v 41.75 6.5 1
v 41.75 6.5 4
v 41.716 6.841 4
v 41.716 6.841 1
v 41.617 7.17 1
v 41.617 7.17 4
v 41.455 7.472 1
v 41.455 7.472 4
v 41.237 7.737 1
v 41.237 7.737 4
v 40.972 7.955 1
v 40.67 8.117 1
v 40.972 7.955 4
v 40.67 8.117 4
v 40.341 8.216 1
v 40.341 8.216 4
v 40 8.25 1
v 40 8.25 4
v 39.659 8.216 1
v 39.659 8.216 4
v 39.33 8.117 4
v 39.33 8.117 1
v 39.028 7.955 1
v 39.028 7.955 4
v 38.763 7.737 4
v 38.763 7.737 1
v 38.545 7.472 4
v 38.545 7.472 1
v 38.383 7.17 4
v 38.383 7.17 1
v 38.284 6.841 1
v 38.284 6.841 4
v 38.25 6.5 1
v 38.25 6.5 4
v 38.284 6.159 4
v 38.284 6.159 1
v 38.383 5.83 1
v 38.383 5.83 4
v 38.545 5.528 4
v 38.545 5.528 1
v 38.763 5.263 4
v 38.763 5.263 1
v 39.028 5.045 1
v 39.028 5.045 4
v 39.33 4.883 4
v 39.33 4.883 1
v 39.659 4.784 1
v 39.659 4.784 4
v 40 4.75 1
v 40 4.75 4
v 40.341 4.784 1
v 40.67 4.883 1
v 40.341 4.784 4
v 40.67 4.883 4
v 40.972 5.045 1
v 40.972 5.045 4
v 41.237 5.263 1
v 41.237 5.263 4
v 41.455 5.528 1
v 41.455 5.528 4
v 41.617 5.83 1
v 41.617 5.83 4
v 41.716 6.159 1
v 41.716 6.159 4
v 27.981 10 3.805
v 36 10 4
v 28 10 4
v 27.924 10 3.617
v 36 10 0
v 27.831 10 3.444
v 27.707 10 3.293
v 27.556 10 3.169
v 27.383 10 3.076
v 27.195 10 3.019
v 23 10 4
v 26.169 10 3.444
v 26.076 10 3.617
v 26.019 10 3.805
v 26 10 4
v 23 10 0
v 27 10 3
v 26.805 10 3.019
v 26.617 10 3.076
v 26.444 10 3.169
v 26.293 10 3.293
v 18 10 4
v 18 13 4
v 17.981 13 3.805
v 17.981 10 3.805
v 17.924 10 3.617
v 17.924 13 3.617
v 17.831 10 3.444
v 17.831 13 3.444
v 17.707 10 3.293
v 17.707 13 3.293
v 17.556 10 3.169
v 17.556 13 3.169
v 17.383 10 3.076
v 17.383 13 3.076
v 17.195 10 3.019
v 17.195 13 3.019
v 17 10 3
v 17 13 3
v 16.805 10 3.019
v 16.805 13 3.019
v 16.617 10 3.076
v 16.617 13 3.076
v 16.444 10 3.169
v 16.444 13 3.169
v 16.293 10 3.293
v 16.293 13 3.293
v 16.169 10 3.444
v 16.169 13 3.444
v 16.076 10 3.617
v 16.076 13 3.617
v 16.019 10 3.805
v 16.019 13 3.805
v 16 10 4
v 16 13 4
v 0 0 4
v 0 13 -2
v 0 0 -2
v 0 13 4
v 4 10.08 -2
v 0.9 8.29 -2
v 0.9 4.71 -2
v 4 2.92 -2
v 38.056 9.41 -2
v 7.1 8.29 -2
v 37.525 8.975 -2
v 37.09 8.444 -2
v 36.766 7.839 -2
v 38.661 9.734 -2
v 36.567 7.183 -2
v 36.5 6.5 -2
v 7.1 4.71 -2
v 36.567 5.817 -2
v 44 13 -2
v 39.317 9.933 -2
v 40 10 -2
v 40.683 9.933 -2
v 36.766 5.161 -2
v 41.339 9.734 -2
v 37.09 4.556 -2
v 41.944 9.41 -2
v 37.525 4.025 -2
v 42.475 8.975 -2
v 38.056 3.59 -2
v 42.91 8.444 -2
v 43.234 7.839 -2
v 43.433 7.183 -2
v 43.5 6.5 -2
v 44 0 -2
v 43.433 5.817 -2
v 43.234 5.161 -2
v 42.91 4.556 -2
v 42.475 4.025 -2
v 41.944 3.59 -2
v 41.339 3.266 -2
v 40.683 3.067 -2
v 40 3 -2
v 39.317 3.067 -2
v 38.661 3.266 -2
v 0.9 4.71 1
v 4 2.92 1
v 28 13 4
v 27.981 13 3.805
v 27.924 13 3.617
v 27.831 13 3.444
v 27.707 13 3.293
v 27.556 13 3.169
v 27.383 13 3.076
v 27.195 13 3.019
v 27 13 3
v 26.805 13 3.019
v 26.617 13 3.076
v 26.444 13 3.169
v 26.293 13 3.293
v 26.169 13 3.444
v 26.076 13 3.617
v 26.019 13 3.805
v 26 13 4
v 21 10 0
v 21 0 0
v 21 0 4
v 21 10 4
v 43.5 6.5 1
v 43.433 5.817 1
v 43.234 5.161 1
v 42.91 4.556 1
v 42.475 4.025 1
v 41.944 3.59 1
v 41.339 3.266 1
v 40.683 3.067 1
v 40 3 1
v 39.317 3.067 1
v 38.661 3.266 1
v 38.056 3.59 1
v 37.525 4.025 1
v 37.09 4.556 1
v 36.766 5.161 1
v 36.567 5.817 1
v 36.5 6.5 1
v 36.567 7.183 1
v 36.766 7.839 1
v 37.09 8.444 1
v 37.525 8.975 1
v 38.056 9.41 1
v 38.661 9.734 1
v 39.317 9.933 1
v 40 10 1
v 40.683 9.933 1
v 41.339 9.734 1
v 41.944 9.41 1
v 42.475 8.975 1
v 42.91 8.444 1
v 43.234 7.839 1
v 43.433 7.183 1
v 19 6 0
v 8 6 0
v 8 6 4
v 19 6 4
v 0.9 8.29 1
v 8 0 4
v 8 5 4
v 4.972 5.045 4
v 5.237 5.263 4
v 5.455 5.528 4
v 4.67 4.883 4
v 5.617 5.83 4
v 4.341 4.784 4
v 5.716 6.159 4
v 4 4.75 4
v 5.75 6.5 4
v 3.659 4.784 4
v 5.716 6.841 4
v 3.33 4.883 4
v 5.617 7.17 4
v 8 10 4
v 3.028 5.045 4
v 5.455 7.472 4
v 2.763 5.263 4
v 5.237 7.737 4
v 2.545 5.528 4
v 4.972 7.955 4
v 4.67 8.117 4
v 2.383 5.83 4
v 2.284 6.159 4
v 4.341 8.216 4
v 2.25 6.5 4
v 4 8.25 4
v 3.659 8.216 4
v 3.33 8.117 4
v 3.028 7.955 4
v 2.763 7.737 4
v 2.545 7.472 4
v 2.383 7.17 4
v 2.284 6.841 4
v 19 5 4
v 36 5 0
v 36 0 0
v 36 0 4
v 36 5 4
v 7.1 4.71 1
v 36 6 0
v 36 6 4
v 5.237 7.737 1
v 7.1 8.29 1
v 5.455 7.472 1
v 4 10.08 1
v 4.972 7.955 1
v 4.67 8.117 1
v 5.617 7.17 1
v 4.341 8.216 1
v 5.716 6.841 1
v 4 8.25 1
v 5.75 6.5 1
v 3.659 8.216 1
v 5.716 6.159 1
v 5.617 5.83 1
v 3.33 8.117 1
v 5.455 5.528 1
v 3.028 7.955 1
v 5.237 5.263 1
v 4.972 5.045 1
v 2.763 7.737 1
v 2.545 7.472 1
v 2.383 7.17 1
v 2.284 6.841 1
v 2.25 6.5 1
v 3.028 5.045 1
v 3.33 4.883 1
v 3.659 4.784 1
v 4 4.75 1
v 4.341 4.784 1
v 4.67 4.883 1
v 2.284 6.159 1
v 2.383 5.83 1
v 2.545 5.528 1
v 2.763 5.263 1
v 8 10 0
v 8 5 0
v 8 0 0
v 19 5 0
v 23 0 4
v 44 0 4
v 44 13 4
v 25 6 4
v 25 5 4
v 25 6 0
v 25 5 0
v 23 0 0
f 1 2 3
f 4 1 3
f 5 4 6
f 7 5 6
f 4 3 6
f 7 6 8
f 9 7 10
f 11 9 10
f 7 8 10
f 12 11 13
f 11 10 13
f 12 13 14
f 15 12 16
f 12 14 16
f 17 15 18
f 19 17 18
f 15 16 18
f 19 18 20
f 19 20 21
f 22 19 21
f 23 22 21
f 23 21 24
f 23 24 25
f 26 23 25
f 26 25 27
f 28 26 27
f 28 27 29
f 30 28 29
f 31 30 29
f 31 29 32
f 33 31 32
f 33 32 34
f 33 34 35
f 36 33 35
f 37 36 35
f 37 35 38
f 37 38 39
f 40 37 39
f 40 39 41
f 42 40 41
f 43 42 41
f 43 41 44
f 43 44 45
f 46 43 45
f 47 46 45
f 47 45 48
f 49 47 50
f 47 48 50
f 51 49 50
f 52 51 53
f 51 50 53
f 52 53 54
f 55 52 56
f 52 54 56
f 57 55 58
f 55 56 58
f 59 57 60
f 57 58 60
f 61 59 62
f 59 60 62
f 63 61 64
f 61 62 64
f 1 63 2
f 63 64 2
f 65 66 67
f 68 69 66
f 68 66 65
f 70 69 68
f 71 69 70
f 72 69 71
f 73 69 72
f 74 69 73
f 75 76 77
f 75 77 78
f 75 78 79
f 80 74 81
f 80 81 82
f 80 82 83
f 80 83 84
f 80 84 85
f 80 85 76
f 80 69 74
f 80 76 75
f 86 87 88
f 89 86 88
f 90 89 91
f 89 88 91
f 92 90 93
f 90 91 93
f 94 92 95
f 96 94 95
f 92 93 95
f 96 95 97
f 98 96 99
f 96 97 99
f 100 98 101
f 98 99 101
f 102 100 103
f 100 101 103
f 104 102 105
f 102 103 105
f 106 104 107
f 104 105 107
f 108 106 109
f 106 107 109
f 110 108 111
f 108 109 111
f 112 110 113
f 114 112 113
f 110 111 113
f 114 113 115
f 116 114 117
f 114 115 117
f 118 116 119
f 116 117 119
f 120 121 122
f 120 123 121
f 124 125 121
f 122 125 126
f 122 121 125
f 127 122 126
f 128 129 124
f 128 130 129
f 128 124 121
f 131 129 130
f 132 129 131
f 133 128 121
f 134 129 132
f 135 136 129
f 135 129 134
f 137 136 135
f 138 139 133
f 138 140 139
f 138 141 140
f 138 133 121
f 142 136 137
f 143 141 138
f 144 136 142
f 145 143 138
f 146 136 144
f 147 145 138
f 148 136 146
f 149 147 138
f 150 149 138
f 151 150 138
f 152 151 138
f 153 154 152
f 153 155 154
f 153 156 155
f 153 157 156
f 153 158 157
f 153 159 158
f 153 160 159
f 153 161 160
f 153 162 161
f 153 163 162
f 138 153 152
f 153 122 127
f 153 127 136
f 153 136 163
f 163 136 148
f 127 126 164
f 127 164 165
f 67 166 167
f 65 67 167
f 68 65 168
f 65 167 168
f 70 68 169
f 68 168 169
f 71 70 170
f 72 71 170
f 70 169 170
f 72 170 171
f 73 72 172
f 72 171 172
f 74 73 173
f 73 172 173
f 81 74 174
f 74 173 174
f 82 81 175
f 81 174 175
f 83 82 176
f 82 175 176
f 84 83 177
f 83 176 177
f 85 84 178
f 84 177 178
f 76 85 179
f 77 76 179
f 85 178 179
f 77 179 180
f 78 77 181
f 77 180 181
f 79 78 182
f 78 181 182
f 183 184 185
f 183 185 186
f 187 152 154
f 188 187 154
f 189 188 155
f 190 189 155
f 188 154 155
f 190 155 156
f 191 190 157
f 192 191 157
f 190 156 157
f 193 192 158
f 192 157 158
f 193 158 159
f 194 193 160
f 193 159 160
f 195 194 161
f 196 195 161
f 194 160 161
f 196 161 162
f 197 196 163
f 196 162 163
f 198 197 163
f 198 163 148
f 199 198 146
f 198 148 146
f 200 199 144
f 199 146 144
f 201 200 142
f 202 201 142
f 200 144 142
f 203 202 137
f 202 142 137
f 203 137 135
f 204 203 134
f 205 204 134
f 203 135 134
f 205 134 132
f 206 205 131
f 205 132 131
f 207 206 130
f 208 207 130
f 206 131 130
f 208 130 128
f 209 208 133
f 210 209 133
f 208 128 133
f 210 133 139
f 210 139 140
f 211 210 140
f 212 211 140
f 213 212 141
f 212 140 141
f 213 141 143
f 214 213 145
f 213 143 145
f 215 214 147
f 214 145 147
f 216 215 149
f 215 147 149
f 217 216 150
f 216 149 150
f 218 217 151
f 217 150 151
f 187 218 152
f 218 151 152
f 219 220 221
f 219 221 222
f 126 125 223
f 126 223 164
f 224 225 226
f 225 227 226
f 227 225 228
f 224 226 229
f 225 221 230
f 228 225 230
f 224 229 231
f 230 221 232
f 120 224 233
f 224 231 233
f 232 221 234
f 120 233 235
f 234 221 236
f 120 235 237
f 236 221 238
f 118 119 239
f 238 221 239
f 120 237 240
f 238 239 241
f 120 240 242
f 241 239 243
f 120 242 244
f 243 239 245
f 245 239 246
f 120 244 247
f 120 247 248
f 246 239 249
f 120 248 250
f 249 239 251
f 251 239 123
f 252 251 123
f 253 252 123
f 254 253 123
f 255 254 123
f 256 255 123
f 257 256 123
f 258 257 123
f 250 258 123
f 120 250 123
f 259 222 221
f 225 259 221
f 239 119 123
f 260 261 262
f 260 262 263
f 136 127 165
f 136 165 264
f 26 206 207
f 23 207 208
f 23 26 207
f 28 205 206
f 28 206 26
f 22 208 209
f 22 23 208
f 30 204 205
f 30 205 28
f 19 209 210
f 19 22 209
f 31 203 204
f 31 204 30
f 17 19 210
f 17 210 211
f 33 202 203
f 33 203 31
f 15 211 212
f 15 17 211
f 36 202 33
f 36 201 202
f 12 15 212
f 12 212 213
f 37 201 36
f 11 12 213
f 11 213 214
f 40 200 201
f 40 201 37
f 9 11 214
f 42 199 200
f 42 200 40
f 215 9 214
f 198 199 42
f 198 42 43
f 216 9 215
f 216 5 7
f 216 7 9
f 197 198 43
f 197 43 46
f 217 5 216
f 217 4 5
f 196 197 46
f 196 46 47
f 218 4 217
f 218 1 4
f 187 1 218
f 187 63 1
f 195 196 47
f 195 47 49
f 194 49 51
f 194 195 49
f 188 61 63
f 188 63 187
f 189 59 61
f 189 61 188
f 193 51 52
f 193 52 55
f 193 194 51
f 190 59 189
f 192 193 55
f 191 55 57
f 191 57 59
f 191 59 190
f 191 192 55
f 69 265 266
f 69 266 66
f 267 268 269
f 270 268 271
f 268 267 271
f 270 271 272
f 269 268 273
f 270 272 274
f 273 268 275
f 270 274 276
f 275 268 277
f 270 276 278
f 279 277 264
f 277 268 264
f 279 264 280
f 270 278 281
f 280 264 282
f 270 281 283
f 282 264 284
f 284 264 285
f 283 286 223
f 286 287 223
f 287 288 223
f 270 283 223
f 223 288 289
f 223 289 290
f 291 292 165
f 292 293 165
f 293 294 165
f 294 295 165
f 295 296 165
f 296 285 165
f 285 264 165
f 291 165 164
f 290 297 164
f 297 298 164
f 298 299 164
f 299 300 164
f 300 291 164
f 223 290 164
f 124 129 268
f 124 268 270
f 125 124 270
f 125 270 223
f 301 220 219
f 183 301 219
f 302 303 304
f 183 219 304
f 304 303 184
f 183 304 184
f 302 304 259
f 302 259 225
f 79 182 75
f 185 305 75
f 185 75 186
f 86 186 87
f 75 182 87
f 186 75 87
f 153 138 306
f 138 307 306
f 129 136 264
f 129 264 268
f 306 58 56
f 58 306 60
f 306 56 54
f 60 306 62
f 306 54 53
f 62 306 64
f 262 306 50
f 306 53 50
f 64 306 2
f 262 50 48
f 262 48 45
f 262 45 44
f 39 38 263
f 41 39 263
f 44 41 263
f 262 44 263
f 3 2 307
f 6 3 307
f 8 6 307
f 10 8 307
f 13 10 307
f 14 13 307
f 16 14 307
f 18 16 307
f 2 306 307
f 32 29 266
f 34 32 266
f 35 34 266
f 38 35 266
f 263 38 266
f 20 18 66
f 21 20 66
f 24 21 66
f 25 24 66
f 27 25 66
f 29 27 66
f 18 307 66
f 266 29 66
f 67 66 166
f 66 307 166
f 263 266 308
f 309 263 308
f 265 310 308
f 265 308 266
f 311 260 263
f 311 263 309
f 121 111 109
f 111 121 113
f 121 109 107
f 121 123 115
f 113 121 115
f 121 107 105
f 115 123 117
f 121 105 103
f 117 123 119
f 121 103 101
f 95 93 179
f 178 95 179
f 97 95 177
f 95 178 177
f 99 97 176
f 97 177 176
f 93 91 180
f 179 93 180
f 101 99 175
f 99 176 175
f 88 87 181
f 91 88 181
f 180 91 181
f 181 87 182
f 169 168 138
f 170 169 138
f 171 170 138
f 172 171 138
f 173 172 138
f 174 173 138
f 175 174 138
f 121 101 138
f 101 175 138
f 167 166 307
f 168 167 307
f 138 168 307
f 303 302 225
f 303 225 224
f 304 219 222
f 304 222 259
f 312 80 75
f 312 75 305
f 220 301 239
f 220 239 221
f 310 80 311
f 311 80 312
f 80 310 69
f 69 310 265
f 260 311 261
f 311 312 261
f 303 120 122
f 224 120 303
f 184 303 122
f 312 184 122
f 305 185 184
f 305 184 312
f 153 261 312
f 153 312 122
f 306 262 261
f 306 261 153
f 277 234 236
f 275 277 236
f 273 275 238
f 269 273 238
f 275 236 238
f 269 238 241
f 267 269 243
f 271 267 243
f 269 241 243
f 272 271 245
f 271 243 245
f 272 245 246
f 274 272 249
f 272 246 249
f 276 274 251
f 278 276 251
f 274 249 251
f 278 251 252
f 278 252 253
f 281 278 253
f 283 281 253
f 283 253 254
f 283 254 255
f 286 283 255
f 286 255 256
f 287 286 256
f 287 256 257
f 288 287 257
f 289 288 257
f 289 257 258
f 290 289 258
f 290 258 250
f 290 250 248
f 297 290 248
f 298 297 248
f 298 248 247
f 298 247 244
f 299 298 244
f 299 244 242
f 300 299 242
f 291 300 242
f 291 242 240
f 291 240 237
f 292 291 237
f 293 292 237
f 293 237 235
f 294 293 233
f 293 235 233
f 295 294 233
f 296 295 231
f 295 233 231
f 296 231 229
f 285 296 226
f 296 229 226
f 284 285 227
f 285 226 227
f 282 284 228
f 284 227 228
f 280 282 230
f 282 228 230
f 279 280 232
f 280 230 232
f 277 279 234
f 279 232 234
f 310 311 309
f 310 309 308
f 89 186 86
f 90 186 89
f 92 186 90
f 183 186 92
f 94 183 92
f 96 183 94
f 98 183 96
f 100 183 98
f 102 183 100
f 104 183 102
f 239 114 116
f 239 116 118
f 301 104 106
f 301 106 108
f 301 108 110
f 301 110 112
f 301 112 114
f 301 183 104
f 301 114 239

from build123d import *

# Parameters (mm, degrees)
PAD_DEPTH       = 4
SKETCH001_R     = 1
POCKET_DEPTH    = 5
SKETCH002_W     = 44
SKETCH002_H     = 13
PAD001_DEPTH    = 2
SKETCH004_R     = 3.5
POCKET001_DEPTH = 3
SKETCH005_R     = 1.75
POCKET002_DEPTH = 5


with BuildPart() as part:
    # Sketch → Pad (new body)
    with BuildSketch(Plane.XY):
        Polygon((8, 10), (8, 6), (19, 6), (19, 5), (8, 5), (8, 0), (0, 0), (0, 13), (44, 13), (44, 0), (36, 0), (36, 5), (25, 5), (25, 6), (36, 6), (36, 10), (23, 10), (23, 0), (21, 0), (21, 10), align=None)
    extrude(amount=PAD_DEPTH)

    # Sketch001 → Pocket (cut)
    with BuildSketch(Plane(origin=(0, 13, 0), x_dir=(-1, 0, 0), z_dir=(0, 1, 0))):
        with Locations((-27, 4)):
            Circle(SKETCH001_R)
        with Locations((-17, 4)):
            Circle(SKETCH001_R)
    extrude(amount=-POCKET_DEPTH, mode=Mode.SUBTRACT)

    # Sketch002 → Pad001 (new body)
    with BuildSketch(Plane(origin=(0, 0, 0), x_dir=(1, 0, 0), z_dir=(0, 0, -1))):
        with Locations((22, -6.5)):
            Rectangle(SKETCH002_W, SKETCH002_H)
    extrude(amount=PAD001_DEPTH)

    # Sketch004 → Pocket001 (cut)
    with BuildSketch(Plane(origin=(0, 0, -2), x_dir=(1, 0, 0), z_dir=(0, 0, -1))):
        with Locations((40, -6.5)):
            Circle(SKETCH004_R)
        Polygon((0.9, -8.289786), (0.9, -4.710214), (4, -2.920428), (7.1, -4.710214), (7.1, -8.289786), (4, -10.079572), align=None)
    extrude(amount=-POCKET001_DEPTH, mode=Mode.SUBTRACT)

    # Sketch005 → Pocket002 (cut)
    with BuildSketch(Plane.XY.offset(4)):
        with Locations((4, 6.5)):
            Circle(SKETCH005_R)
        with Locations((40, 6.5)):
            Circle(SKETCH005_R)
    extrude(amount=-POCKET002_DEPTH, mode=Mode.SUBTRACT)


solid = part.part
